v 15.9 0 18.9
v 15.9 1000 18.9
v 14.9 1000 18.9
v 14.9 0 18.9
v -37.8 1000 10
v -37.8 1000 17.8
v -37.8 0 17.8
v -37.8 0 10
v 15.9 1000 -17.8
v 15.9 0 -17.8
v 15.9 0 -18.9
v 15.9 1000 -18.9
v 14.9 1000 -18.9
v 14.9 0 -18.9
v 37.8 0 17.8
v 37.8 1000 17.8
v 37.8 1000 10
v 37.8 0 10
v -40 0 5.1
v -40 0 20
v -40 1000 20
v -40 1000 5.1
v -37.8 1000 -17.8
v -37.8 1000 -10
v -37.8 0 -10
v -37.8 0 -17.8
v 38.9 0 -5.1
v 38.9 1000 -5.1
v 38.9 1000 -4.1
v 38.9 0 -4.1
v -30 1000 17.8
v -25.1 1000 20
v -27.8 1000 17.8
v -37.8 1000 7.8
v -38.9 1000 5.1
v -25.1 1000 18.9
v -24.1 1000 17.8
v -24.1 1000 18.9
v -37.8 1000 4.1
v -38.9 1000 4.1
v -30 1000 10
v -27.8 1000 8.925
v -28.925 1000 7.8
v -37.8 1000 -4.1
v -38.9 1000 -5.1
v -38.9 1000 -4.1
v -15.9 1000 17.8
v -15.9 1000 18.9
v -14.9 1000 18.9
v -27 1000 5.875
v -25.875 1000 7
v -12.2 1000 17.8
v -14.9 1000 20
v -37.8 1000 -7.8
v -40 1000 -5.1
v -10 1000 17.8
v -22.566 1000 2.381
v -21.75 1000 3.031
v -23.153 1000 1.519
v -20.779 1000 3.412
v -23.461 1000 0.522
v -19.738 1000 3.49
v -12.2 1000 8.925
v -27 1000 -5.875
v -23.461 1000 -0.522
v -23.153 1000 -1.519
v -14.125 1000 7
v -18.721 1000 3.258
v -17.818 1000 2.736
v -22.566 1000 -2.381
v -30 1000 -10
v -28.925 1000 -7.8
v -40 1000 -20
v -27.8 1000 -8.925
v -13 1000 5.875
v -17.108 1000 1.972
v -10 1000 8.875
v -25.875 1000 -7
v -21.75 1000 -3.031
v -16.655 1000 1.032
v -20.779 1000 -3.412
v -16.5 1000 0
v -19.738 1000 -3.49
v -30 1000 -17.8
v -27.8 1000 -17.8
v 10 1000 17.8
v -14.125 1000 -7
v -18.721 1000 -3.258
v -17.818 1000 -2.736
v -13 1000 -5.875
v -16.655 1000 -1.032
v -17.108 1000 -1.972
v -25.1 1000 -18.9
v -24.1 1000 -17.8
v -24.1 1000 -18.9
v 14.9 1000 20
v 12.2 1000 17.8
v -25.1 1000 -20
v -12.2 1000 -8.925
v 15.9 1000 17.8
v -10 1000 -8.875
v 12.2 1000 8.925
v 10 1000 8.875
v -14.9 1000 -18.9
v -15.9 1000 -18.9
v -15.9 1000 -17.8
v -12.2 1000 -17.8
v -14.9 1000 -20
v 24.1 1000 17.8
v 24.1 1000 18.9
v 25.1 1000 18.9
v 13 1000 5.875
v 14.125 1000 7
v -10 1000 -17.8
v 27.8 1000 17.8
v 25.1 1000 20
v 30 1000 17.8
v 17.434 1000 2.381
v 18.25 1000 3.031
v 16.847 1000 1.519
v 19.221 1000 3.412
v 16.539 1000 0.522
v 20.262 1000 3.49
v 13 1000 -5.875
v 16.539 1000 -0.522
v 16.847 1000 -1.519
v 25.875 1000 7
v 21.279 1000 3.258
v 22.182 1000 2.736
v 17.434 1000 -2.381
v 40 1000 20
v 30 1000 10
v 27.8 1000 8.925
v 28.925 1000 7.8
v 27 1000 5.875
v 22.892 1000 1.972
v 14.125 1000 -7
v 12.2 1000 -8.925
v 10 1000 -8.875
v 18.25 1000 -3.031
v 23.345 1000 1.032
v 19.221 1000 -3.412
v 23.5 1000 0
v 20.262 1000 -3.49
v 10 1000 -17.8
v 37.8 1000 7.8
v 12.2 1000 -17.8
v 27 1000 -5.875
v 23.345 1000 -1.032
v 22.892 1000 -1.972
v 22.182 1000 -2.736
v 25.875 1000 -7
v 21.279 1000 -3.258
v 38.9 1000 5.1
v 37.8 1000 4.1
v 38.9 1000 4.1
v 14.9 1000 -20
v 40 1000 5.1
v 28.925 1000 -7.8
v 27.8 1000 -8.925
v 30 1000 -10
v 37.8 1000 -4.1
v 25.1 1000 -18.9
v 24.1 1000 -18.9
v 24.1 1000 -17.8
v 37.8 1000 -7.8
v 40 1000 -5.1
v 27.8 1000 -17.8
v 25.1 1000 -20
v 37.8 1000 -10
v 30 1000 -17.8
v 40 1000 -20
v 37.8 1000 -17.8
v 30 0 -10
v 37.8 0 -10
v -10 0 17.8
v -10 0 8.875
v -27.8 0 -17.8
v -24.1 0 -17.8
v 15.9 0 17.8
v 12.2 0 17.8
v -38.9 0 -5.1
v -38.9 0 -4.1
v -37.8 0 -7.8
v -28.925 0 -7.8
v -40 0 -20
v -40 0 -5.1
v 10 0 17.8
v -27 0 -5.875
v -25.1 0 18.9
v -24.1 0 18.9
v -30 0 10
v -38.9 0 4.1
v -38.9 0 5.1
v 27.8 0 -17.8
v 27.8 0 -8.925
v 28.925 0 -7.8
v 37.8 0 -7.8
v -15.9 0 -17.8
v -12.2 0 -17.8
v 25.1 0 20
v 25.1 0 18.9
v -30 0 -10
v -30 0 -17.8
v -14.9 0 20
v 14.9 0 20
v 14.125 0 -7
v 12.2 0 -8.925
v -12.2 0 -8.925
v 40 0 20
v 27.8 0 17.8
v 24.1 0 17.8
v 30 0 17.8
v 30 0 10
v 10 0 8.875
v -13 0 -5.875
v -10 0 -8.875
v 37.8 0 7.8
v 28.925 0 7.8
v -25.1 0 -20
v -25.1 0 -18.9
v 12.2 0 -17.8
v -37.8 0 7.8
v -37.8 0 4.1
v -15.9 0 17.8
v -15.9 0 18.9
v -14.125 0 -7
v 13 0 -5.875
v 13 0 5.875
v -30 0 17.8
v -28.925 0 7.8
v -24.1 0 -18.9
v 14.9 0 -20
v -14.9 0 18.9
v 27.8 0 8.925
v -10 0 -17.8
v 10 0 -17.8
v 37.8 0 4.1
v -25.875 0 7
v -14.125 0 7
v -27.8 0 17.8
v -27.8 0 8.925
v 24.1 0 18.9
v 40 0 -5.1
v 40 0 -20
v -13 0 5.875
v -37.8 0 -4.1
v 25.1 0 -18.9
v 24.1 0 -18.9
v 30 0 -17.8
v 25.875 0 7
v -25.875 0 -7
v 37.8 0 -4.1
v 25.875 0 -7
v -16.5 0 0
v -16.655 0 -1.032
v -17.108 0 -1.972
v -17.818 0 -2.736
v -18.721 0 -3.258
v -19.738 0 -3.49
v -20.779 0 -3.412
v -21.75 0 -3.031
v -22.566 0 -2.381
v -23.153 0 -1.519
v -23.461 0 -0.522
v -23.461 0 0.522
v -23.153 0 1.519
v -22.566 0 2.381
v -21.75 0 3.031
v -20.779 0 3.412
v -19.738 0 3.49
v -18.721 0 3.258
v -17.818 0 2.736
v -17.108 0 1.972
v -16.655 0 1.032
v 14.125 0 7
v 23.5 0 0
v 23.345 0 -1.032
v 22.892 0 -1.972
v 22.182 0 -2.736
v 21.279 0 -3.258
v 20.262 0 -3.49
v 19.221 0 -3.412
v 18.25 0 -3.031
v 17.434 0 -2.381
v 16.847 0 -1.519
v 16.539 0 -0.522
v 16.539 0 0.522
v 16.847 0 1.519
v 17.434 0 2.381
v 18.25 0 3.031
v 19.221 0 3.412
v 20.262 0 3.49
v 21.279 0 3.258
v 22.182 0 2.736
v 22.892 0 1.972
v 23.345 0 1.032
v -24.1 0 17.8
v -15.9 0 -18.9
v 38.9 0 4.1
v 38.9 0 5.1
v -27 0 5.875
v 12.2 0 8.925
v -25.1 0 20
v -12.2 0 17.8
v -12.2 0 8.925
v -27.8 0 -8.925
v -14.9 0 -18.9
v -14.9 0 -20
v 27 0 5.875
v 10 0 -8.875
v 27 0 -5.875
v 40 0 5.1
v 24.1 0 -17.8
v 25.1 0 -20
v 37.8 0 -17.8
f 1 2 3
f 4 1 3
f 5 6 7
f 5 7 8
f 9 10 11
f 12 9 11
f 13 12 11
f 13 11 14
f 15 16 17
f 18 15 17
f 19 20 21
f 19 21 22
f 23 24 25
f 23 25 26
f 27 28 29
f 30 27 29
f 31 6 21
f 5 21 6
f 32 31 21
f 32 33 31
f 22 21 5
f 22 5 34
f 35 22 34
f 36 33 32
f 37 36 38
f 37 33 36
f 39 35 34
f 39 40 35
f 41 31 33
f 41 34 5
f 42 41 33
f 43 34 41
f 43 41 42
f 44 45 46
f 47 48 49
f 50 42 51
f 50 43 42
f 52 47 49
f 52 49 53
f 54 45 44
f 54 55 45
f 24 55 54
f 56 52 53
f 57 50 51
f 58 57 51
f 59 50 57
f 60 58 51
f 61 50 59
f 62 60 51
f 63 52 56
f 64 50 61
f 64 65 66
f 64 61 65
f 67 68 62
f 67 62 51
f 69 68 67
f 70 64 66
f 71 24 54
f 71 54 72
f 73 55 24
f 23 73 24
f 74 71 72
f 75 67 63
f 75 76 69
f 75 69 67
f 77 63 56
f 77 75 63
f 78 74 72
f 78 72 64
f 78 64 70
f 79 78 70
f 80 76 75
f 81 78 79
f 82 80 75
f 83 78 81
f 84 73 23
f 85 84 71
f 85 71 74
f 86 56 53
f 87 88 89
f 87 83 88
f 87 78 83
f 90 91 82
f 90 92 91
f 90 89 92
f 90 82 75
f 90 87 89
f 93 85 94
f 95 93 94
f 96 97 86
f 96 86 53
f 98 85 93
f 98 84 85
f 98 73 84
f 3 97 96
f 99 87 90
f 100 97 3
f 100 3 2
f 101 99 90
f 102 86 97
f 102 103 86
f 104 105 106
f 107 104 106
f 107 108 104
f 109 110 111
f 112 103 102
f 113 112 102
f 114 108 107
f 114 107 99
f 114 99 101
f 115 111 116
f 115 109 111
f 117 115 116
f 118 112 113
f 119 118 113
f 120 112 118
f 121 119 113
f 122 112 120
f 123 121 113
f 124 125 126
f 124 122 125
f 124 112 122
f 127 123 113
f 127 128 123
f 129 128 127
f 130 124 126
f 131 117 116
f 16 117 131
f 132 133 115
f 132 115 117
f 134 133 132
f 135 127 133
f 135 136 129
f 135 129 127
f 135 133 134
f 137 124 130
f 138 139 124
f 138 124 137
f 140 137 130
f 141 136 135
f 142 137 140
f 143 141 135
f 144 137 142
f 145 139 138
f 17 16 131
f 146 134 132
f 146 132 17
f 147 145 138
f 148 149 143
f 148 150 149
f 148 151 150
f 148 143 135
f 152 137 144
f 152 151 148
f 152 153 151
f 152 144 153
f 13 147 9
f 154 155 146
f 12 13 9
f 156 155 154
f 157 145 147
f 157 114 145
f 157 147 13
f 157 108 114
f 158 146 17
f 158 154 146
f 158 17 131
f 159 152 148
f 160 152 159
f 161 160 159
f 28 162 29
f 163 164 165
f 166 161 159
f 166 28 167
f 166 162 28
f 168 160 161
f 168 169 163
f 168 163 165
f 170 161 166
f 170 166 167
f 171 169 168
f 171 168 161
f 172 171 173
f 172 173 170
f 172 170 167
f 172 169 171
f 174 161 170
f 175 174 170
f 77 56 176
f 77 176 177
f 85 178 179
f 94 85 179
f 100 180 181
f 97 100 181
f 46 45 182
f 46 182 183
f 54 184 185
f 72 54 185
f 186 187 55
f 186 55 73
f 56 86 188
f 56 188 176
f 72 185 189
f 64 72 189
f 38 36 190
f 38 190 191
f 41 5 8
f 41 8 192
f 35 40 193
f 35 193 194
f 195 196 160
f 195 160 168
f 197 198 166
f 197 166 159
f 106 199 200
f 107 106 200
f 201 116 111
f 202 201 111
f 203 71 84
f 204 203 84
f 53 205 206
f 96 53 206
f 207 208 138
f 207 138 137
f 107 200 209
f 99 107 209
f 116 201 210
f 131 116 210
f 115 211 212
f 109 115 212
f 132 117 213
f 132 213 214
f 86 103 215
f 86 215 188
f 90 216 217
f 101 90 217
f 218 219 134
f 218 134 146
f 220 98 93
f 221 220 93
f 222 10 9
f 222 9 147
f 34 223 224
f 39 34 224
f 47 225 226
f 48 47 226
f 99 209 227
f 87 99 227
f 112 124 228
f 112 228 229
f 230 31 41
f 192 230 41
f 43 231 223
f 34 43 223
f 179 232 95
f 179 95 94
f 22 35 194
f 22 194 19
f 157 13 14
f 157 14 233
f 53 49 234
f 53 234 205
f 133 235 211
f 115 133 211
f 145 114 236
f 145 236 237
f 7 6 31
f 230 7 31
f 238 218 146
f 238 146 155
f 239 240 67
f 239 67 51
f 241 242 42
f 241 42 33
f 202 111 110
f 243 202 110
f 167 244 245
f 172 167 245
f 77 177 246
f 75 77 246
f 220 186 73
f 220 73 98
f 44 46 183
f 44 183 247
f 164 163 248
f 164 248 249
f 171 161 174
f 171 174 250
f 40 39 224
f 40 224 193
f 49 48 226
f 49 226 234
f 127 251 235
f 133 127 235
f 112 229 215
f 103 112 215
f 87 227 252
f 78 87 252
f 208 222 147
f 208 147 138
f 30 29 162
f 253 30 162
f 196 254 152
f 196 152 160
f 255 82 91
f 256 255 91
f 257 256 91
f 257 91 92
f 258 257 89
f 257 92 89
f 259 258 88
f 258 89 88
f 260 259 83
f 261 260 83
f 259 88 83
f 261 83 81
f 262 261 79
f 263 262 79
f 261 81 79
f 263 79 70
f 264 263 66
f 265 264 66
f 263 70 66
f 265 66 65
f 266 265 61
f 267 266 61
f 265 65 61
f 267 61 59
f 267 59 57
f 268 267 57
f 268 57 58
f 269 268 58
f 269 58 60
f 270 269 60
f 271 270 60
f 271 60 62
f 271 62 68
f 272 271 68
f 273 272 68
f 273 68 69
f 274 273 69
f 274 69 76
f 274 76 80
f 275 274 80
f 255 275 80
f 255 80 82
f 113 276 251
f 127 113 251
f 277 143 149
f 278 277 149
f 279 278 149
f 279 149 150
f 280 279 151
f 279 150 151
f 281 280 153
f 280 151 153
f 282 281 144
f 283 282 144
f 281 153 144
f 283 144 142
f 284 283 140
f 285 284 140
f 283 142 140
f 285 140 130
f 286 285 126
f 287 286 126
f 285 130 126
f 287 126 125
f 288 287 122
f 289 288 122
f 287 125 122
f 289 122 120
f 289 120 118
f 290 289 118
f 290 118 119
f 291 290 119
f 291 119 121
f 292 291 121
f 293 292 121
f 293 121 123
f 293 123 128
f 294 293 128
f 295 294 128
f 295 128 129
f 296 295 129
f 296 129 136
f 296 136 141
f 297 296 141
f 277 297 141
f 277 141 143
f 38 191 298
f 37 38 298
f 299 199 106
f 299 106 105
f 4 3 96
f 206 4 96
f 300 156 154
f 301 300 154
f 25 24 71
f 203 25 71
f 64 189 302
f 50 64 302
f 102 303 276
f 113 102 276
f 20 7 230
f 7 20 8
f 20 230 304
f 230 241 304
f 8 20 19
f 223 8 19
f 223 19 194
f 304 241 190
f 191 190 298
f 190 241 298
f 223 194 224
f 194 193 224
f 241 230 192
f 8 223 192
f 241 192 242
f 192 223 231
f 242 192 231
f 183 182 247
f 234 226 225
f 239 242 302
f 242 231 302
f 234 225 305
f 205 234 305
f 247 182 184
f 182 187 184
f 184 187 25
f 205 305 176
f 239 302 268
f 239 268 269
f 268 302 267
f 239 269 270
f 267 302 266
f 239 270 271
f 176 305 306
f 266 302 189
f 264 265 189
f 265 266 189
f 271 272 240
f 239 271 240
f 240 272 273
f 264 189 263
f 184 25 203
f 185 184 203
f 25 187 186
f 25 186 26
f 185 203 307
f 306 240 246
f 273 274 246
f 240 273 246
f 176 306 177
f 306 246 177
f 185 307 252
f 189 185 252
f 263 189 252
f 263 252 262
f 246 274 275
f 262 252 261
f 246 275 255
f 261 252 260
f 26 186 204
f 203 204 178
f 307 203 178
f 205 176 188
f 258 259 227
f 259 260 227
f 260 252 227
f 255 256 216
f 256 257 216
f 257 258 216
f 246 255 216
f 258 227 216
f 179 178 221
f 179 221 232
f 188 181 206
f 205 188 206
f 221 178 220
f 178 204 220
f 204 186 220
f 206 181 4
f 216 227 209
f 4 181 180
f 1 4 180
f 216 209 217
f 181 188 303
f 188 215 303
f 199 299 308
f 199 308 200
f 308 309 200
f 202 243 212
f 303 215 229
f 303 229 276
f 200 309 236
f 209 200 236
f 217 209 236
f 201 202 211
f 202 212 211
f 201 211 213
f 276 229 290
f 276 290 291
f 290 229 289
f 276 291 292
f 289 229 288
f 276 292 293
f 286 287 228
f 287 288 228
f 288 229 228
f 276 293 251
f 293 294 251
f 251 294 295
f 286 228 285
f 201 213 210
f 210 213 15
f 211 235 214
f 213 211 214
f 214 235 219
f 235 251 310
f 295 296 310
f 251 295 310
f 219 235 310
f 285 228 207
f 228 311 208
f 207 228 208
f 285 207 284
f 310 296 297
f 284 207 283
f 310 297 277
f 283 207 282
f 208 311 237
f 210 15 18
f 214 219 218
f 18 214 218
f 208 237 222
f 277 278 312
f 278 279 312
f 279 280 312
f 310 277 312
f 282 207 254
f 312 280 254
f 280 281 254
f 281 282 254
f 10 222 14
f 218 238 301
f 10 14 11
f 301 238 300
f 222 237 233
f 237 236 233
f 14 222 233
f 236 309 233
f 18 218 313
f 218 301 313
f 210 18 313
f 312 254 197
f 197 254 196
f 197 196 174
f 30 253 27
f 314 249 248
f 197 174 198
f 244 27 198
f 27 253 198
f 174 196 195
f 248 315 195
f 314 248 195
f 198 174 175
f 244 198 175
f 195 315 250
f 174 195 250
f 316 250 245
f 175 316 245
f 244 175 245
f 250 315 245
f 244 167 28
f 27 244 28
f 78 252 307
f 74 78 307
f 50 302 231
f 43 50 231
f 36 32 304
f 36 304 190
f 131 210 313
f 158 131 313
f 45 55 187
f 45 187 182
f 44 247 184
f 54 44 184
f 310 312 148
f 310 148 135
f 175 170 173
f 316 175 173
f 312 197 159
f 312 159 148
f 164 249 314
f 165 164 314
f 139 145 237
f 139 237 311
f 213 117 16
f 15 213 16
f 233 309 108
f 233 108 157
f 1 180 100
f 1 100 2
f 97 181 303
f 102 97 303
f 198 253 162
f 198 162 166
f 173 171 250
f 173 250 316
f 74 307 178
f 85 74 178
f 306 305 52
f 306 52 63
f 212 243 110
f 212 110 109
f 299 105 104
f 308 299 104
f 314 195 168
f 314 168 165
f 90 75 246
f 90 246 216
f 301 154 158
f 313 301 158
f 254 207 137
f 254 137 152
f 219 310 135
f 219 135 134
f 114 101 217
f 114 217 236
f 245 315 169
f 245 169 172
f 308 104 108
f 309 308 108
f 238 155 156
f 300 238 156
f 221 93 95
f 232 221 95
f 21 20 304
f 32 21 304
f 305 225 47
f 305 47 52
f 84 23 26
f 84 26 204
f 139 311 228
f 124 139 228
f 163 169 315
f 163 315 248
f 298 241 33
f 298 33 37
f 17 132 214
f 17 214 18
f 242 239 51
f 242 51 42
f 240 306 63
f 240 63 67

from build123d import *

# Parameters (mm, degrees)
SKETCH1_W           = 80
SKETCH1_H           = 40
BOSS_EXTRUDE1_DEPTH = 1000
SKETCH2_W           = 7.8
SKETCH2_H           = 7.8
CUT_EXTRUDE1_DEPTH  = 1001
SKETCH3_R           = 3.5
CUT_EXTRUDE2_DEPTH  = 1001


with BuildPart() as part:
    # Sketch1 → Boss-Extrude1 (new body)
    with BuildSketch(Plane(origin=(0, 0, 0), x_dir=(1, 0, 0), z_dir=(0, 1, 0))):
        Rectangle(SKETCH1_W, SKETCH1_H)
        Polygon((-27.8, -17.8), (-12.2, -17.8), (-12.2, -8.925), (-14.125, -7), (-25.875, -7), (-27.8, -8.925), align=None, mode=Mode.SUBTRACT)
        Polygon((-28.925, -7.8), (-37.8, -7.8), (-37.8, 7.8), (-28.925, 7.8), (-27, 5.875), (-27, -5.875), align=None, mode=Mode.SUBTRACT)
        Polygon((-27.8, 8.925), (-27.8, 17.8), (-12.2, 17.8), (-12.2, 8.925), (-14.125, 7), (-25.875, 7), align=None, mode=Mode.SUBTRACT)
        Polygon((27.8, 17.8), (12.2, 17.8), (12.2, 8.925), (14.125, 7), (25.875, 7), (27.8, 8.925), align=None, mode=Mode.SUBTRACT)
        Polygon((37.8, -7.8), (37.8, 7.8), (28.925, 7.8), (27, 5.875), (27, -5.875), (28.925, -7.8), align=None, mode=Mode.SUBTRACT)
        Polygon((27.8, -8.925), (27.8, -17.8), (12.2, -17.8), (12.2, -8.925), (14.125, -7), (25.875, -7), align=None, mode=Mode.SUBTRACT)
    extrude(amount=BOSS_EXTRUDE1_DEPTH)

    # Sketch2 → Cut-Extrude1 (cut, through all)
    with BuildSketch(Plane(origin=(0, 1000, 0), x_dir=(1, 0, 0), z_dir=(0, 1, 0))):
        with Locations((33.9, -13.9)):
            Rectangle(SKETCH2_W, SKETCH2_H)
        Polygon((-10, -17.8), (-10, -8.875), (-13, -5.875), (-13, 5.875), (-10, 8.875), (-10, 17.8), (10, 17.8), (10, 8.875), (13, 5.875), (13, -5.875), (10, -8.875), (10, -17.8), align=None)
        with Locations((33.9, 13.9)):
            Rectangle(SKETCH2_W, SKETCH2_H)
        with Locations((-33.9, -13.9)):
            Rectangle(SKETCH2_W, SKETCH2_H)
        with Locations((-33.9, 13.9)):
            Rectangle(SKETCH2_W, SKETCH2_H)
    extrude(amount=-CUT_EXTRUDE1_DEPTH, mode=Mode.SUBTRACT)

    # Sketch3 → Cut-Extrude2 (cut, through all)
    with BuildSketch(Plane(origin=(0, 1000, 0), x_dir=(1, 0, 0), z_dir=(0, 1, 0))):
        with Locations((-20, 0)):
            Circle(SKETCH3_R)
        with Locations((20, 0)):
            Circle(SKETCH3_R)
        Polygon((-25.1, 20), (-25.1, 18.9), (-24.1, 18.9), (-24.1, 17.8), (-15.9, 17.8), (-15.9, 18.9), (-14.9, 18.9), (-14.9, 20), align=None)
        Polygon((-37.8, 4.1), (-37.8, -4.1), (-38.9, -4.1), (-38.9, -5.1), (-40, -5.1), (-40, 5.1), (-38.9, 5.1), (-38.9, 4.1), align=None)
        Polygon((-24.1, -17.8), (-15.9, -17.8), (-15.9, -18.9), (-14.9, -18.9), (-14.9, -20), (-25.1, -20), (-25.1, -18.9), (-24.1, -18.9), align=None)
        Polygon((25.1, -20), (25.1, -18.9), (24.1, -18.9), (24.1, -17.8), (15.9, -17.8), (15.9, -18.9), (14.9, -18.9), (14.9, -20), align=None)
        Polygon((40, 5.1), (38.9, 5.1), (38.9, 4.1), (37.8, 4.1), (37.8, -4.1), (38.9, -4.1), (38.9, -5.1), (40, -5.1), align=None)
        Polygon((24.1, 17.8), (15.9, 17.8), (15.9, 18.9), (14.9, 18.9), (14.9, 20), (25.1, 20), (25.1, 18.9), (24.1, 18.9), align=None)
    extrude(amount=-CUT_EXTRUDE2_DEPTH, mode=Mode.SUBTRACT)


solid = part.part
